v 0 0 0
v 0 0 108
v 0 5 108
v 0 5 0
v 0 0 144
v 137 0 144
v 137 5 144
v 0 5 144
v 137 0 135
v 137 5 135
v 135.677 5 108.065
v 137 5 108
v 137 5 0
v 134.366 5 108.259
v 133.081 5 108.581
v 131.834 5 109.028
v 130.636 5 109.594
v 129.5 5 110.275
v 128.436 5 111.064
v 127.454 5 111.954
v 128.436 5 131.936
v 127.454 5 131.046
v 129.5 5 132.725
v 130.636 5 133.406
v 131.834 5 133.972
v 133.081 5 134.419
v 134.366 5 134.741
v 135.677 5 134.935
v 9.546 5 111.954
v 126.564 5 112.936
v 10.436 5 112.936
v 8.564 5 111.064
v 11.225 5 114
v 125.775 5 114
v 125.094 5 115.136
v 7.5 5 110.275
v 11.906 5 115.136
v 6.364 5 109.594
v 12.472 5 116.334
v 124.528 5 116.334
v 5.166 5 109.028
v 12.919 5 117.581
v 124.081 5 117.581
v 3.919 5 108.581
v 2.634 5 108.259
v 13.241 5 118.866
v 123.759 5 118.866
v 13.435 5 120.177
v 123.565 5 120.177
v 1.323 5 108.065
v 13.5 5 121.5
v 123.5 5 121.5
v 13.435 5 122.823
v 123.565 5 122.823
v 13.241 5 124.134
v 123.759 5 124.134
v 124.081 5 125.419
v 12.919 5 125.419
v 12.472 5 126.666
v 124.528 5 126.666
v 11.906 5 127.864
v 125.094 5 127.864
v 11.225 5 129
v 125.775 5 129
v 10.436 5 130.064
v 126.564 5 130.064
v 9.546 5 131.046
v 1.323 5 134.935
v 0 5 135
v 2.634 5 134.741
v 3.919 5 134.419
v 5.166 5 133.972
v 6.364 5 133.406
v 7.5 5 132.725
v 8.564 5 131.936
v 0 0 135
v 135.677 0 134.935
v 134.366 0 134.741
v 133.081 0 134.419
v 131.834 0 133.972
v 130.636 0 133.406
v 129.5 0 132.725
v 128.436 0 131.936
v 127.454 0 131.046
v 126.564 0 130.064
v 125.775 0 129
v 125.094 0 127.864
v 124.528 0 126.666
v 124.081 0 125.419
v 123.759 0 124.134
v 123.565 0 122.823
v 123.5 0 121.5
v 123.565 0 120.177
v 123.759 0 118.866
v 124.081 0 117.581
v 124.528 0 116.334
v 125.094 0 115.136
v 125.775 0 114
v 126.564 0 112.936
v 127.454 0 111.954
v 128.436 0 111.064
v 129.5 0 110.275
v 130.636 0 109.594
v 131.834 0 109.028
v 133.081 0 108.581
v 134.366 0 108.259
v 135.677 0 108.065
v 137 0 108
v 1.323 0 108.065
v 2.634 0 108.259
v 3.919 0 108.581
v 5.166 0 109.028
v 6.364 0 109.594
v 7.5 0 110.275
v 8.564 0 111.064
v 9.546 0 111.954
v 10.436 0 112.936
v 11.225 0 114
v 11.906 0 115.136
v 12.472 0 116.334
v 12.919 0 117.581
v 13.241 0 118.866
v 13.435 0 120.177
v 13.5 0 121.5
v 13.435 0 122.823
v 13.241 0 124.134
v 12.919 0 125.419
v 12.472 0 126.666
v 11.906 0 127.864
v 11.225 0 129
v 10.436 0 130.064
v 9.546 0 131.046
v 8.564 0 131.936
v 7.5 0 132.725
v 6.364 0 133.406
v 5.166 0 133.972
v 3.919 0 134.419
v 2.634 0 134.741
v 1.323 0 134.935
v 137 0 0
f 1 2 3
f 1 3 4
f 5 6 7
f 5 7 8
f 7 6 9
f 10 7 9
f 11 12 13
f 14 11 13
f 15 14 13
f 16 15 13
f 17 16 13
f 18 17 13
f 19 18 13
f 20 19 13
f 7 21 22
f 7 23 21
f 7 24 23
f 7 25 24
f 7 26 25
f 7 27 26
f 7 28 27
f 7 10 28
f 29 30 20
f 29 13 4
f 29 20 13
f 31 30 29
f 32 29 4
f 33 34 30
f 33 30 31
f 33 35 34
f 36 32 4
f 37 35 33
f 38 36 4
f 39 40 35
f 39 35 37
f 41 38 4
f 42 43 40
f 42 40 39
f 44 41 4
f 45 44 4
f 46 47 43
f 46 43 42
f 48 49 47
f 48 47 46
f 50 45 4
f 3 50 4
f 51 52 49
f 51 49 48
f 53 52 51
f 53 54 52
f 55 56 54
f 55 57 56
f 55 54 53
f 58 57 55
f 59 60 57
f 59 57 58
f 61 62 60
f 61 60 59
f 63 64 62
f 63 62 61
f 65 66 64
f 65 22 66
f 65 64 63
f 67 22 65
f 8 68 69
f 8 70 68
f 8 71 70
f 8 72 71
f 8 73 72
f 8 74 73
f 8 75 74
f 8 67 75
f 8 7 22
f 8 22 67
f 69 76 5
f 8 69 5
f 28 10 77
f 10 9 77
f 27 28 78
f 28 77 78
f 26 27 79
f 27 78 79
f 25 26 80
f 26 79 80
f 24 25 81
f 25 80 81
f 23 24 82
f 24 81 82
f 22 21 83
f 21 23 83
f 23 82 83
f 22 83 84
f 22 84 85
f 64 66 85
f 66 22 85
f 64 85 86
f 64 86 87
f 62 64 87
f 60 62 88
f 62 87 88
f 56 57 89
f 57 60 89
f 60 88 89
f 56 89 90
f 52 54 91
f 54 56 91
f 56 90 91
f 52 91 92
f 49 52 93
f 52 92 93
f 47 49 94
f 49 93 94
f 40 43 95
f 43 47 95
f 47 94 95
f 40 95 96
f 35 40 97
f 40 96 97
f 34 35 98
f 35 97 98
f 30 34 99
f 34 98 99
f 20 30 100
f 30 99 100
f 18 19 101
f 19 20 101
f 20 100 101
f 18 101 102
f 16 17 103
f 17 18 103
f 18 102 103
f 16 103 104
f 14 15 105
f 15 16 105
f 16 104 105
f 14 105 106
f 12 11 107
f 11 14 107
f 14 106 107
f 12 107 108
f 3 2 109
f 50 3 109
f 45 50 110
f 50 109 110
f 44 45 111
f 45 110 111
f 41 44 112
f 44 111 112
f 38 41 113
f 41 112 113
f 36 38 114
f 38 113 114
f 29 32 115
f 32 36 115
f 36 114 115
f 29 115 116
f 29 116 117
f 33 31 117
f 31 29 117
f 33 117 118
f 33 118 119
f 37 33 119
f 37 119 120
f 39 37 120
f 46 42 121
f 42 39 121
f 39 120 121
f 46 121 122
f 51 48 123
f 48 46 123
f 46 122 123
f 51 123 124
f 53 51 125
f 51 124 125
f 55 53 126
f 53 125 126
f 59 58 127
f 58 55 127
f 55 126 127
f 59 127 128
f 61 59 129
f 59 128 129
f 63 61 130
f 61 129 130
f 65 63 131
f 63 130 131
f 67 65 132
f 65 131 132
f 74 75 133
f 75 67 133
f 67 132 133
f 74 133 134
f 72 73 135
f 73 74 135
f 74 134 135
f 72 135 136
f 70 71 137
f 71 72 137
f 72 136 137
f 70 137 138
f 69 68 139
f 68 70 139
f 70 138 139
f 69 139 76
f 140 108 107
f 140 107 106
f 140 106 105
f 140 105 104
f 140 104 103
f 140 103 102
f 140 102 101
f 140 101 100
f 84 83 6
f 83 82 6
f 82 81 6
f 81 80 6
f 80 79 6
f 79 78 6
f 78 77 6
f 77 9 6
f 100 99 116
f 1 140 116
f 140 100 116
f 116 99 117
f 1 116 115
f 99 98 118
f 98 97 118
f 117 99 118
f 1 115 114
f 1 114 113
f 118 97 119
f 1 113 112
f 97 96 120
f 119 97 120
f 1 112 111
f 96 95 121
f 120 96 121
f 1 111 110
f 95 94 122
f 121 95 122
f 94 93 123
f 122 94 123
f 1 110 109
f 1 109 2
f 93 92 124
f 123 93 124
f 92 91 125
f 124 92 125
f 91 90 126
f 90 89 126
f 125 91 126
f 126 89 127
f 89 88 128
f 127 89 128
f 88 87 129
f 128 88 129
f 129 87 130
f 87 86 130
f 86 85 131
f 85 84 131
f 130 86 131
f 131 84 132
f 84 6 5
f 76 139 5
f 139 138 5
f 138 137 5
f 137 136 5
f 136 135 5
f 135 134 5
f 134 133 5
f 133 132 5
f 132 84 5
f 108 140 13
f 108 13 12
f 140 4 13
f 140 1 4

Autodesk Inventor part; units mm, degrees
ref_plane "YZ Plane" through (0, 0, 0) normal (1, 0, 0) x (0, 1, 0)
ref_plane "XZ Plane" through (0, 0, 0) normal (0, 1, 0) x (-1, 0, 0)
ref_plane "XY Plane" through (0, 0, 0) normal (0, 0, 1) x (1, 0, 0)
sketch "Sketch2" plane through (0, 0, 0) normal (0, 1, 0) x (-1, 0, 0)
  line L0 (0, 0) -> (-137, 0)
  line L1 (-137, 144) -> (0, 144)
  line L2 (0, 144) -> (-137, 144)
  line L3 (-137, 144) -> (-137, 134.2279)
  line L4 (0, 135) -> (0, 144)
  arc A0 (0, 135) -> (0, 108) centre (0, 121.5) ccw
  line L5 (-137, 0) -> (-137, 108.7721)
  line L6 (-137, 134.2279) -> (-137, 144)
  line L7 (0, 144) -> (0, 135)
  line L8 (0, 108) -> (0, 0)
  arc A1 (-137, 108) -> (-137, 135) centre (-137, 121.5) ccw
  point P0 (-13.5, 121.5)
  point P1 (-123.5, 121.5)
  dimension "d0" = 137
  dimension "d4" = 27
  dimension "d6" = 27
  dimension "d7" = 110
  dimension "d8" = 22.5
extrude "Extrusion1" add sketch "Sketch2" along normal blind 5
properties part number "Cover"
